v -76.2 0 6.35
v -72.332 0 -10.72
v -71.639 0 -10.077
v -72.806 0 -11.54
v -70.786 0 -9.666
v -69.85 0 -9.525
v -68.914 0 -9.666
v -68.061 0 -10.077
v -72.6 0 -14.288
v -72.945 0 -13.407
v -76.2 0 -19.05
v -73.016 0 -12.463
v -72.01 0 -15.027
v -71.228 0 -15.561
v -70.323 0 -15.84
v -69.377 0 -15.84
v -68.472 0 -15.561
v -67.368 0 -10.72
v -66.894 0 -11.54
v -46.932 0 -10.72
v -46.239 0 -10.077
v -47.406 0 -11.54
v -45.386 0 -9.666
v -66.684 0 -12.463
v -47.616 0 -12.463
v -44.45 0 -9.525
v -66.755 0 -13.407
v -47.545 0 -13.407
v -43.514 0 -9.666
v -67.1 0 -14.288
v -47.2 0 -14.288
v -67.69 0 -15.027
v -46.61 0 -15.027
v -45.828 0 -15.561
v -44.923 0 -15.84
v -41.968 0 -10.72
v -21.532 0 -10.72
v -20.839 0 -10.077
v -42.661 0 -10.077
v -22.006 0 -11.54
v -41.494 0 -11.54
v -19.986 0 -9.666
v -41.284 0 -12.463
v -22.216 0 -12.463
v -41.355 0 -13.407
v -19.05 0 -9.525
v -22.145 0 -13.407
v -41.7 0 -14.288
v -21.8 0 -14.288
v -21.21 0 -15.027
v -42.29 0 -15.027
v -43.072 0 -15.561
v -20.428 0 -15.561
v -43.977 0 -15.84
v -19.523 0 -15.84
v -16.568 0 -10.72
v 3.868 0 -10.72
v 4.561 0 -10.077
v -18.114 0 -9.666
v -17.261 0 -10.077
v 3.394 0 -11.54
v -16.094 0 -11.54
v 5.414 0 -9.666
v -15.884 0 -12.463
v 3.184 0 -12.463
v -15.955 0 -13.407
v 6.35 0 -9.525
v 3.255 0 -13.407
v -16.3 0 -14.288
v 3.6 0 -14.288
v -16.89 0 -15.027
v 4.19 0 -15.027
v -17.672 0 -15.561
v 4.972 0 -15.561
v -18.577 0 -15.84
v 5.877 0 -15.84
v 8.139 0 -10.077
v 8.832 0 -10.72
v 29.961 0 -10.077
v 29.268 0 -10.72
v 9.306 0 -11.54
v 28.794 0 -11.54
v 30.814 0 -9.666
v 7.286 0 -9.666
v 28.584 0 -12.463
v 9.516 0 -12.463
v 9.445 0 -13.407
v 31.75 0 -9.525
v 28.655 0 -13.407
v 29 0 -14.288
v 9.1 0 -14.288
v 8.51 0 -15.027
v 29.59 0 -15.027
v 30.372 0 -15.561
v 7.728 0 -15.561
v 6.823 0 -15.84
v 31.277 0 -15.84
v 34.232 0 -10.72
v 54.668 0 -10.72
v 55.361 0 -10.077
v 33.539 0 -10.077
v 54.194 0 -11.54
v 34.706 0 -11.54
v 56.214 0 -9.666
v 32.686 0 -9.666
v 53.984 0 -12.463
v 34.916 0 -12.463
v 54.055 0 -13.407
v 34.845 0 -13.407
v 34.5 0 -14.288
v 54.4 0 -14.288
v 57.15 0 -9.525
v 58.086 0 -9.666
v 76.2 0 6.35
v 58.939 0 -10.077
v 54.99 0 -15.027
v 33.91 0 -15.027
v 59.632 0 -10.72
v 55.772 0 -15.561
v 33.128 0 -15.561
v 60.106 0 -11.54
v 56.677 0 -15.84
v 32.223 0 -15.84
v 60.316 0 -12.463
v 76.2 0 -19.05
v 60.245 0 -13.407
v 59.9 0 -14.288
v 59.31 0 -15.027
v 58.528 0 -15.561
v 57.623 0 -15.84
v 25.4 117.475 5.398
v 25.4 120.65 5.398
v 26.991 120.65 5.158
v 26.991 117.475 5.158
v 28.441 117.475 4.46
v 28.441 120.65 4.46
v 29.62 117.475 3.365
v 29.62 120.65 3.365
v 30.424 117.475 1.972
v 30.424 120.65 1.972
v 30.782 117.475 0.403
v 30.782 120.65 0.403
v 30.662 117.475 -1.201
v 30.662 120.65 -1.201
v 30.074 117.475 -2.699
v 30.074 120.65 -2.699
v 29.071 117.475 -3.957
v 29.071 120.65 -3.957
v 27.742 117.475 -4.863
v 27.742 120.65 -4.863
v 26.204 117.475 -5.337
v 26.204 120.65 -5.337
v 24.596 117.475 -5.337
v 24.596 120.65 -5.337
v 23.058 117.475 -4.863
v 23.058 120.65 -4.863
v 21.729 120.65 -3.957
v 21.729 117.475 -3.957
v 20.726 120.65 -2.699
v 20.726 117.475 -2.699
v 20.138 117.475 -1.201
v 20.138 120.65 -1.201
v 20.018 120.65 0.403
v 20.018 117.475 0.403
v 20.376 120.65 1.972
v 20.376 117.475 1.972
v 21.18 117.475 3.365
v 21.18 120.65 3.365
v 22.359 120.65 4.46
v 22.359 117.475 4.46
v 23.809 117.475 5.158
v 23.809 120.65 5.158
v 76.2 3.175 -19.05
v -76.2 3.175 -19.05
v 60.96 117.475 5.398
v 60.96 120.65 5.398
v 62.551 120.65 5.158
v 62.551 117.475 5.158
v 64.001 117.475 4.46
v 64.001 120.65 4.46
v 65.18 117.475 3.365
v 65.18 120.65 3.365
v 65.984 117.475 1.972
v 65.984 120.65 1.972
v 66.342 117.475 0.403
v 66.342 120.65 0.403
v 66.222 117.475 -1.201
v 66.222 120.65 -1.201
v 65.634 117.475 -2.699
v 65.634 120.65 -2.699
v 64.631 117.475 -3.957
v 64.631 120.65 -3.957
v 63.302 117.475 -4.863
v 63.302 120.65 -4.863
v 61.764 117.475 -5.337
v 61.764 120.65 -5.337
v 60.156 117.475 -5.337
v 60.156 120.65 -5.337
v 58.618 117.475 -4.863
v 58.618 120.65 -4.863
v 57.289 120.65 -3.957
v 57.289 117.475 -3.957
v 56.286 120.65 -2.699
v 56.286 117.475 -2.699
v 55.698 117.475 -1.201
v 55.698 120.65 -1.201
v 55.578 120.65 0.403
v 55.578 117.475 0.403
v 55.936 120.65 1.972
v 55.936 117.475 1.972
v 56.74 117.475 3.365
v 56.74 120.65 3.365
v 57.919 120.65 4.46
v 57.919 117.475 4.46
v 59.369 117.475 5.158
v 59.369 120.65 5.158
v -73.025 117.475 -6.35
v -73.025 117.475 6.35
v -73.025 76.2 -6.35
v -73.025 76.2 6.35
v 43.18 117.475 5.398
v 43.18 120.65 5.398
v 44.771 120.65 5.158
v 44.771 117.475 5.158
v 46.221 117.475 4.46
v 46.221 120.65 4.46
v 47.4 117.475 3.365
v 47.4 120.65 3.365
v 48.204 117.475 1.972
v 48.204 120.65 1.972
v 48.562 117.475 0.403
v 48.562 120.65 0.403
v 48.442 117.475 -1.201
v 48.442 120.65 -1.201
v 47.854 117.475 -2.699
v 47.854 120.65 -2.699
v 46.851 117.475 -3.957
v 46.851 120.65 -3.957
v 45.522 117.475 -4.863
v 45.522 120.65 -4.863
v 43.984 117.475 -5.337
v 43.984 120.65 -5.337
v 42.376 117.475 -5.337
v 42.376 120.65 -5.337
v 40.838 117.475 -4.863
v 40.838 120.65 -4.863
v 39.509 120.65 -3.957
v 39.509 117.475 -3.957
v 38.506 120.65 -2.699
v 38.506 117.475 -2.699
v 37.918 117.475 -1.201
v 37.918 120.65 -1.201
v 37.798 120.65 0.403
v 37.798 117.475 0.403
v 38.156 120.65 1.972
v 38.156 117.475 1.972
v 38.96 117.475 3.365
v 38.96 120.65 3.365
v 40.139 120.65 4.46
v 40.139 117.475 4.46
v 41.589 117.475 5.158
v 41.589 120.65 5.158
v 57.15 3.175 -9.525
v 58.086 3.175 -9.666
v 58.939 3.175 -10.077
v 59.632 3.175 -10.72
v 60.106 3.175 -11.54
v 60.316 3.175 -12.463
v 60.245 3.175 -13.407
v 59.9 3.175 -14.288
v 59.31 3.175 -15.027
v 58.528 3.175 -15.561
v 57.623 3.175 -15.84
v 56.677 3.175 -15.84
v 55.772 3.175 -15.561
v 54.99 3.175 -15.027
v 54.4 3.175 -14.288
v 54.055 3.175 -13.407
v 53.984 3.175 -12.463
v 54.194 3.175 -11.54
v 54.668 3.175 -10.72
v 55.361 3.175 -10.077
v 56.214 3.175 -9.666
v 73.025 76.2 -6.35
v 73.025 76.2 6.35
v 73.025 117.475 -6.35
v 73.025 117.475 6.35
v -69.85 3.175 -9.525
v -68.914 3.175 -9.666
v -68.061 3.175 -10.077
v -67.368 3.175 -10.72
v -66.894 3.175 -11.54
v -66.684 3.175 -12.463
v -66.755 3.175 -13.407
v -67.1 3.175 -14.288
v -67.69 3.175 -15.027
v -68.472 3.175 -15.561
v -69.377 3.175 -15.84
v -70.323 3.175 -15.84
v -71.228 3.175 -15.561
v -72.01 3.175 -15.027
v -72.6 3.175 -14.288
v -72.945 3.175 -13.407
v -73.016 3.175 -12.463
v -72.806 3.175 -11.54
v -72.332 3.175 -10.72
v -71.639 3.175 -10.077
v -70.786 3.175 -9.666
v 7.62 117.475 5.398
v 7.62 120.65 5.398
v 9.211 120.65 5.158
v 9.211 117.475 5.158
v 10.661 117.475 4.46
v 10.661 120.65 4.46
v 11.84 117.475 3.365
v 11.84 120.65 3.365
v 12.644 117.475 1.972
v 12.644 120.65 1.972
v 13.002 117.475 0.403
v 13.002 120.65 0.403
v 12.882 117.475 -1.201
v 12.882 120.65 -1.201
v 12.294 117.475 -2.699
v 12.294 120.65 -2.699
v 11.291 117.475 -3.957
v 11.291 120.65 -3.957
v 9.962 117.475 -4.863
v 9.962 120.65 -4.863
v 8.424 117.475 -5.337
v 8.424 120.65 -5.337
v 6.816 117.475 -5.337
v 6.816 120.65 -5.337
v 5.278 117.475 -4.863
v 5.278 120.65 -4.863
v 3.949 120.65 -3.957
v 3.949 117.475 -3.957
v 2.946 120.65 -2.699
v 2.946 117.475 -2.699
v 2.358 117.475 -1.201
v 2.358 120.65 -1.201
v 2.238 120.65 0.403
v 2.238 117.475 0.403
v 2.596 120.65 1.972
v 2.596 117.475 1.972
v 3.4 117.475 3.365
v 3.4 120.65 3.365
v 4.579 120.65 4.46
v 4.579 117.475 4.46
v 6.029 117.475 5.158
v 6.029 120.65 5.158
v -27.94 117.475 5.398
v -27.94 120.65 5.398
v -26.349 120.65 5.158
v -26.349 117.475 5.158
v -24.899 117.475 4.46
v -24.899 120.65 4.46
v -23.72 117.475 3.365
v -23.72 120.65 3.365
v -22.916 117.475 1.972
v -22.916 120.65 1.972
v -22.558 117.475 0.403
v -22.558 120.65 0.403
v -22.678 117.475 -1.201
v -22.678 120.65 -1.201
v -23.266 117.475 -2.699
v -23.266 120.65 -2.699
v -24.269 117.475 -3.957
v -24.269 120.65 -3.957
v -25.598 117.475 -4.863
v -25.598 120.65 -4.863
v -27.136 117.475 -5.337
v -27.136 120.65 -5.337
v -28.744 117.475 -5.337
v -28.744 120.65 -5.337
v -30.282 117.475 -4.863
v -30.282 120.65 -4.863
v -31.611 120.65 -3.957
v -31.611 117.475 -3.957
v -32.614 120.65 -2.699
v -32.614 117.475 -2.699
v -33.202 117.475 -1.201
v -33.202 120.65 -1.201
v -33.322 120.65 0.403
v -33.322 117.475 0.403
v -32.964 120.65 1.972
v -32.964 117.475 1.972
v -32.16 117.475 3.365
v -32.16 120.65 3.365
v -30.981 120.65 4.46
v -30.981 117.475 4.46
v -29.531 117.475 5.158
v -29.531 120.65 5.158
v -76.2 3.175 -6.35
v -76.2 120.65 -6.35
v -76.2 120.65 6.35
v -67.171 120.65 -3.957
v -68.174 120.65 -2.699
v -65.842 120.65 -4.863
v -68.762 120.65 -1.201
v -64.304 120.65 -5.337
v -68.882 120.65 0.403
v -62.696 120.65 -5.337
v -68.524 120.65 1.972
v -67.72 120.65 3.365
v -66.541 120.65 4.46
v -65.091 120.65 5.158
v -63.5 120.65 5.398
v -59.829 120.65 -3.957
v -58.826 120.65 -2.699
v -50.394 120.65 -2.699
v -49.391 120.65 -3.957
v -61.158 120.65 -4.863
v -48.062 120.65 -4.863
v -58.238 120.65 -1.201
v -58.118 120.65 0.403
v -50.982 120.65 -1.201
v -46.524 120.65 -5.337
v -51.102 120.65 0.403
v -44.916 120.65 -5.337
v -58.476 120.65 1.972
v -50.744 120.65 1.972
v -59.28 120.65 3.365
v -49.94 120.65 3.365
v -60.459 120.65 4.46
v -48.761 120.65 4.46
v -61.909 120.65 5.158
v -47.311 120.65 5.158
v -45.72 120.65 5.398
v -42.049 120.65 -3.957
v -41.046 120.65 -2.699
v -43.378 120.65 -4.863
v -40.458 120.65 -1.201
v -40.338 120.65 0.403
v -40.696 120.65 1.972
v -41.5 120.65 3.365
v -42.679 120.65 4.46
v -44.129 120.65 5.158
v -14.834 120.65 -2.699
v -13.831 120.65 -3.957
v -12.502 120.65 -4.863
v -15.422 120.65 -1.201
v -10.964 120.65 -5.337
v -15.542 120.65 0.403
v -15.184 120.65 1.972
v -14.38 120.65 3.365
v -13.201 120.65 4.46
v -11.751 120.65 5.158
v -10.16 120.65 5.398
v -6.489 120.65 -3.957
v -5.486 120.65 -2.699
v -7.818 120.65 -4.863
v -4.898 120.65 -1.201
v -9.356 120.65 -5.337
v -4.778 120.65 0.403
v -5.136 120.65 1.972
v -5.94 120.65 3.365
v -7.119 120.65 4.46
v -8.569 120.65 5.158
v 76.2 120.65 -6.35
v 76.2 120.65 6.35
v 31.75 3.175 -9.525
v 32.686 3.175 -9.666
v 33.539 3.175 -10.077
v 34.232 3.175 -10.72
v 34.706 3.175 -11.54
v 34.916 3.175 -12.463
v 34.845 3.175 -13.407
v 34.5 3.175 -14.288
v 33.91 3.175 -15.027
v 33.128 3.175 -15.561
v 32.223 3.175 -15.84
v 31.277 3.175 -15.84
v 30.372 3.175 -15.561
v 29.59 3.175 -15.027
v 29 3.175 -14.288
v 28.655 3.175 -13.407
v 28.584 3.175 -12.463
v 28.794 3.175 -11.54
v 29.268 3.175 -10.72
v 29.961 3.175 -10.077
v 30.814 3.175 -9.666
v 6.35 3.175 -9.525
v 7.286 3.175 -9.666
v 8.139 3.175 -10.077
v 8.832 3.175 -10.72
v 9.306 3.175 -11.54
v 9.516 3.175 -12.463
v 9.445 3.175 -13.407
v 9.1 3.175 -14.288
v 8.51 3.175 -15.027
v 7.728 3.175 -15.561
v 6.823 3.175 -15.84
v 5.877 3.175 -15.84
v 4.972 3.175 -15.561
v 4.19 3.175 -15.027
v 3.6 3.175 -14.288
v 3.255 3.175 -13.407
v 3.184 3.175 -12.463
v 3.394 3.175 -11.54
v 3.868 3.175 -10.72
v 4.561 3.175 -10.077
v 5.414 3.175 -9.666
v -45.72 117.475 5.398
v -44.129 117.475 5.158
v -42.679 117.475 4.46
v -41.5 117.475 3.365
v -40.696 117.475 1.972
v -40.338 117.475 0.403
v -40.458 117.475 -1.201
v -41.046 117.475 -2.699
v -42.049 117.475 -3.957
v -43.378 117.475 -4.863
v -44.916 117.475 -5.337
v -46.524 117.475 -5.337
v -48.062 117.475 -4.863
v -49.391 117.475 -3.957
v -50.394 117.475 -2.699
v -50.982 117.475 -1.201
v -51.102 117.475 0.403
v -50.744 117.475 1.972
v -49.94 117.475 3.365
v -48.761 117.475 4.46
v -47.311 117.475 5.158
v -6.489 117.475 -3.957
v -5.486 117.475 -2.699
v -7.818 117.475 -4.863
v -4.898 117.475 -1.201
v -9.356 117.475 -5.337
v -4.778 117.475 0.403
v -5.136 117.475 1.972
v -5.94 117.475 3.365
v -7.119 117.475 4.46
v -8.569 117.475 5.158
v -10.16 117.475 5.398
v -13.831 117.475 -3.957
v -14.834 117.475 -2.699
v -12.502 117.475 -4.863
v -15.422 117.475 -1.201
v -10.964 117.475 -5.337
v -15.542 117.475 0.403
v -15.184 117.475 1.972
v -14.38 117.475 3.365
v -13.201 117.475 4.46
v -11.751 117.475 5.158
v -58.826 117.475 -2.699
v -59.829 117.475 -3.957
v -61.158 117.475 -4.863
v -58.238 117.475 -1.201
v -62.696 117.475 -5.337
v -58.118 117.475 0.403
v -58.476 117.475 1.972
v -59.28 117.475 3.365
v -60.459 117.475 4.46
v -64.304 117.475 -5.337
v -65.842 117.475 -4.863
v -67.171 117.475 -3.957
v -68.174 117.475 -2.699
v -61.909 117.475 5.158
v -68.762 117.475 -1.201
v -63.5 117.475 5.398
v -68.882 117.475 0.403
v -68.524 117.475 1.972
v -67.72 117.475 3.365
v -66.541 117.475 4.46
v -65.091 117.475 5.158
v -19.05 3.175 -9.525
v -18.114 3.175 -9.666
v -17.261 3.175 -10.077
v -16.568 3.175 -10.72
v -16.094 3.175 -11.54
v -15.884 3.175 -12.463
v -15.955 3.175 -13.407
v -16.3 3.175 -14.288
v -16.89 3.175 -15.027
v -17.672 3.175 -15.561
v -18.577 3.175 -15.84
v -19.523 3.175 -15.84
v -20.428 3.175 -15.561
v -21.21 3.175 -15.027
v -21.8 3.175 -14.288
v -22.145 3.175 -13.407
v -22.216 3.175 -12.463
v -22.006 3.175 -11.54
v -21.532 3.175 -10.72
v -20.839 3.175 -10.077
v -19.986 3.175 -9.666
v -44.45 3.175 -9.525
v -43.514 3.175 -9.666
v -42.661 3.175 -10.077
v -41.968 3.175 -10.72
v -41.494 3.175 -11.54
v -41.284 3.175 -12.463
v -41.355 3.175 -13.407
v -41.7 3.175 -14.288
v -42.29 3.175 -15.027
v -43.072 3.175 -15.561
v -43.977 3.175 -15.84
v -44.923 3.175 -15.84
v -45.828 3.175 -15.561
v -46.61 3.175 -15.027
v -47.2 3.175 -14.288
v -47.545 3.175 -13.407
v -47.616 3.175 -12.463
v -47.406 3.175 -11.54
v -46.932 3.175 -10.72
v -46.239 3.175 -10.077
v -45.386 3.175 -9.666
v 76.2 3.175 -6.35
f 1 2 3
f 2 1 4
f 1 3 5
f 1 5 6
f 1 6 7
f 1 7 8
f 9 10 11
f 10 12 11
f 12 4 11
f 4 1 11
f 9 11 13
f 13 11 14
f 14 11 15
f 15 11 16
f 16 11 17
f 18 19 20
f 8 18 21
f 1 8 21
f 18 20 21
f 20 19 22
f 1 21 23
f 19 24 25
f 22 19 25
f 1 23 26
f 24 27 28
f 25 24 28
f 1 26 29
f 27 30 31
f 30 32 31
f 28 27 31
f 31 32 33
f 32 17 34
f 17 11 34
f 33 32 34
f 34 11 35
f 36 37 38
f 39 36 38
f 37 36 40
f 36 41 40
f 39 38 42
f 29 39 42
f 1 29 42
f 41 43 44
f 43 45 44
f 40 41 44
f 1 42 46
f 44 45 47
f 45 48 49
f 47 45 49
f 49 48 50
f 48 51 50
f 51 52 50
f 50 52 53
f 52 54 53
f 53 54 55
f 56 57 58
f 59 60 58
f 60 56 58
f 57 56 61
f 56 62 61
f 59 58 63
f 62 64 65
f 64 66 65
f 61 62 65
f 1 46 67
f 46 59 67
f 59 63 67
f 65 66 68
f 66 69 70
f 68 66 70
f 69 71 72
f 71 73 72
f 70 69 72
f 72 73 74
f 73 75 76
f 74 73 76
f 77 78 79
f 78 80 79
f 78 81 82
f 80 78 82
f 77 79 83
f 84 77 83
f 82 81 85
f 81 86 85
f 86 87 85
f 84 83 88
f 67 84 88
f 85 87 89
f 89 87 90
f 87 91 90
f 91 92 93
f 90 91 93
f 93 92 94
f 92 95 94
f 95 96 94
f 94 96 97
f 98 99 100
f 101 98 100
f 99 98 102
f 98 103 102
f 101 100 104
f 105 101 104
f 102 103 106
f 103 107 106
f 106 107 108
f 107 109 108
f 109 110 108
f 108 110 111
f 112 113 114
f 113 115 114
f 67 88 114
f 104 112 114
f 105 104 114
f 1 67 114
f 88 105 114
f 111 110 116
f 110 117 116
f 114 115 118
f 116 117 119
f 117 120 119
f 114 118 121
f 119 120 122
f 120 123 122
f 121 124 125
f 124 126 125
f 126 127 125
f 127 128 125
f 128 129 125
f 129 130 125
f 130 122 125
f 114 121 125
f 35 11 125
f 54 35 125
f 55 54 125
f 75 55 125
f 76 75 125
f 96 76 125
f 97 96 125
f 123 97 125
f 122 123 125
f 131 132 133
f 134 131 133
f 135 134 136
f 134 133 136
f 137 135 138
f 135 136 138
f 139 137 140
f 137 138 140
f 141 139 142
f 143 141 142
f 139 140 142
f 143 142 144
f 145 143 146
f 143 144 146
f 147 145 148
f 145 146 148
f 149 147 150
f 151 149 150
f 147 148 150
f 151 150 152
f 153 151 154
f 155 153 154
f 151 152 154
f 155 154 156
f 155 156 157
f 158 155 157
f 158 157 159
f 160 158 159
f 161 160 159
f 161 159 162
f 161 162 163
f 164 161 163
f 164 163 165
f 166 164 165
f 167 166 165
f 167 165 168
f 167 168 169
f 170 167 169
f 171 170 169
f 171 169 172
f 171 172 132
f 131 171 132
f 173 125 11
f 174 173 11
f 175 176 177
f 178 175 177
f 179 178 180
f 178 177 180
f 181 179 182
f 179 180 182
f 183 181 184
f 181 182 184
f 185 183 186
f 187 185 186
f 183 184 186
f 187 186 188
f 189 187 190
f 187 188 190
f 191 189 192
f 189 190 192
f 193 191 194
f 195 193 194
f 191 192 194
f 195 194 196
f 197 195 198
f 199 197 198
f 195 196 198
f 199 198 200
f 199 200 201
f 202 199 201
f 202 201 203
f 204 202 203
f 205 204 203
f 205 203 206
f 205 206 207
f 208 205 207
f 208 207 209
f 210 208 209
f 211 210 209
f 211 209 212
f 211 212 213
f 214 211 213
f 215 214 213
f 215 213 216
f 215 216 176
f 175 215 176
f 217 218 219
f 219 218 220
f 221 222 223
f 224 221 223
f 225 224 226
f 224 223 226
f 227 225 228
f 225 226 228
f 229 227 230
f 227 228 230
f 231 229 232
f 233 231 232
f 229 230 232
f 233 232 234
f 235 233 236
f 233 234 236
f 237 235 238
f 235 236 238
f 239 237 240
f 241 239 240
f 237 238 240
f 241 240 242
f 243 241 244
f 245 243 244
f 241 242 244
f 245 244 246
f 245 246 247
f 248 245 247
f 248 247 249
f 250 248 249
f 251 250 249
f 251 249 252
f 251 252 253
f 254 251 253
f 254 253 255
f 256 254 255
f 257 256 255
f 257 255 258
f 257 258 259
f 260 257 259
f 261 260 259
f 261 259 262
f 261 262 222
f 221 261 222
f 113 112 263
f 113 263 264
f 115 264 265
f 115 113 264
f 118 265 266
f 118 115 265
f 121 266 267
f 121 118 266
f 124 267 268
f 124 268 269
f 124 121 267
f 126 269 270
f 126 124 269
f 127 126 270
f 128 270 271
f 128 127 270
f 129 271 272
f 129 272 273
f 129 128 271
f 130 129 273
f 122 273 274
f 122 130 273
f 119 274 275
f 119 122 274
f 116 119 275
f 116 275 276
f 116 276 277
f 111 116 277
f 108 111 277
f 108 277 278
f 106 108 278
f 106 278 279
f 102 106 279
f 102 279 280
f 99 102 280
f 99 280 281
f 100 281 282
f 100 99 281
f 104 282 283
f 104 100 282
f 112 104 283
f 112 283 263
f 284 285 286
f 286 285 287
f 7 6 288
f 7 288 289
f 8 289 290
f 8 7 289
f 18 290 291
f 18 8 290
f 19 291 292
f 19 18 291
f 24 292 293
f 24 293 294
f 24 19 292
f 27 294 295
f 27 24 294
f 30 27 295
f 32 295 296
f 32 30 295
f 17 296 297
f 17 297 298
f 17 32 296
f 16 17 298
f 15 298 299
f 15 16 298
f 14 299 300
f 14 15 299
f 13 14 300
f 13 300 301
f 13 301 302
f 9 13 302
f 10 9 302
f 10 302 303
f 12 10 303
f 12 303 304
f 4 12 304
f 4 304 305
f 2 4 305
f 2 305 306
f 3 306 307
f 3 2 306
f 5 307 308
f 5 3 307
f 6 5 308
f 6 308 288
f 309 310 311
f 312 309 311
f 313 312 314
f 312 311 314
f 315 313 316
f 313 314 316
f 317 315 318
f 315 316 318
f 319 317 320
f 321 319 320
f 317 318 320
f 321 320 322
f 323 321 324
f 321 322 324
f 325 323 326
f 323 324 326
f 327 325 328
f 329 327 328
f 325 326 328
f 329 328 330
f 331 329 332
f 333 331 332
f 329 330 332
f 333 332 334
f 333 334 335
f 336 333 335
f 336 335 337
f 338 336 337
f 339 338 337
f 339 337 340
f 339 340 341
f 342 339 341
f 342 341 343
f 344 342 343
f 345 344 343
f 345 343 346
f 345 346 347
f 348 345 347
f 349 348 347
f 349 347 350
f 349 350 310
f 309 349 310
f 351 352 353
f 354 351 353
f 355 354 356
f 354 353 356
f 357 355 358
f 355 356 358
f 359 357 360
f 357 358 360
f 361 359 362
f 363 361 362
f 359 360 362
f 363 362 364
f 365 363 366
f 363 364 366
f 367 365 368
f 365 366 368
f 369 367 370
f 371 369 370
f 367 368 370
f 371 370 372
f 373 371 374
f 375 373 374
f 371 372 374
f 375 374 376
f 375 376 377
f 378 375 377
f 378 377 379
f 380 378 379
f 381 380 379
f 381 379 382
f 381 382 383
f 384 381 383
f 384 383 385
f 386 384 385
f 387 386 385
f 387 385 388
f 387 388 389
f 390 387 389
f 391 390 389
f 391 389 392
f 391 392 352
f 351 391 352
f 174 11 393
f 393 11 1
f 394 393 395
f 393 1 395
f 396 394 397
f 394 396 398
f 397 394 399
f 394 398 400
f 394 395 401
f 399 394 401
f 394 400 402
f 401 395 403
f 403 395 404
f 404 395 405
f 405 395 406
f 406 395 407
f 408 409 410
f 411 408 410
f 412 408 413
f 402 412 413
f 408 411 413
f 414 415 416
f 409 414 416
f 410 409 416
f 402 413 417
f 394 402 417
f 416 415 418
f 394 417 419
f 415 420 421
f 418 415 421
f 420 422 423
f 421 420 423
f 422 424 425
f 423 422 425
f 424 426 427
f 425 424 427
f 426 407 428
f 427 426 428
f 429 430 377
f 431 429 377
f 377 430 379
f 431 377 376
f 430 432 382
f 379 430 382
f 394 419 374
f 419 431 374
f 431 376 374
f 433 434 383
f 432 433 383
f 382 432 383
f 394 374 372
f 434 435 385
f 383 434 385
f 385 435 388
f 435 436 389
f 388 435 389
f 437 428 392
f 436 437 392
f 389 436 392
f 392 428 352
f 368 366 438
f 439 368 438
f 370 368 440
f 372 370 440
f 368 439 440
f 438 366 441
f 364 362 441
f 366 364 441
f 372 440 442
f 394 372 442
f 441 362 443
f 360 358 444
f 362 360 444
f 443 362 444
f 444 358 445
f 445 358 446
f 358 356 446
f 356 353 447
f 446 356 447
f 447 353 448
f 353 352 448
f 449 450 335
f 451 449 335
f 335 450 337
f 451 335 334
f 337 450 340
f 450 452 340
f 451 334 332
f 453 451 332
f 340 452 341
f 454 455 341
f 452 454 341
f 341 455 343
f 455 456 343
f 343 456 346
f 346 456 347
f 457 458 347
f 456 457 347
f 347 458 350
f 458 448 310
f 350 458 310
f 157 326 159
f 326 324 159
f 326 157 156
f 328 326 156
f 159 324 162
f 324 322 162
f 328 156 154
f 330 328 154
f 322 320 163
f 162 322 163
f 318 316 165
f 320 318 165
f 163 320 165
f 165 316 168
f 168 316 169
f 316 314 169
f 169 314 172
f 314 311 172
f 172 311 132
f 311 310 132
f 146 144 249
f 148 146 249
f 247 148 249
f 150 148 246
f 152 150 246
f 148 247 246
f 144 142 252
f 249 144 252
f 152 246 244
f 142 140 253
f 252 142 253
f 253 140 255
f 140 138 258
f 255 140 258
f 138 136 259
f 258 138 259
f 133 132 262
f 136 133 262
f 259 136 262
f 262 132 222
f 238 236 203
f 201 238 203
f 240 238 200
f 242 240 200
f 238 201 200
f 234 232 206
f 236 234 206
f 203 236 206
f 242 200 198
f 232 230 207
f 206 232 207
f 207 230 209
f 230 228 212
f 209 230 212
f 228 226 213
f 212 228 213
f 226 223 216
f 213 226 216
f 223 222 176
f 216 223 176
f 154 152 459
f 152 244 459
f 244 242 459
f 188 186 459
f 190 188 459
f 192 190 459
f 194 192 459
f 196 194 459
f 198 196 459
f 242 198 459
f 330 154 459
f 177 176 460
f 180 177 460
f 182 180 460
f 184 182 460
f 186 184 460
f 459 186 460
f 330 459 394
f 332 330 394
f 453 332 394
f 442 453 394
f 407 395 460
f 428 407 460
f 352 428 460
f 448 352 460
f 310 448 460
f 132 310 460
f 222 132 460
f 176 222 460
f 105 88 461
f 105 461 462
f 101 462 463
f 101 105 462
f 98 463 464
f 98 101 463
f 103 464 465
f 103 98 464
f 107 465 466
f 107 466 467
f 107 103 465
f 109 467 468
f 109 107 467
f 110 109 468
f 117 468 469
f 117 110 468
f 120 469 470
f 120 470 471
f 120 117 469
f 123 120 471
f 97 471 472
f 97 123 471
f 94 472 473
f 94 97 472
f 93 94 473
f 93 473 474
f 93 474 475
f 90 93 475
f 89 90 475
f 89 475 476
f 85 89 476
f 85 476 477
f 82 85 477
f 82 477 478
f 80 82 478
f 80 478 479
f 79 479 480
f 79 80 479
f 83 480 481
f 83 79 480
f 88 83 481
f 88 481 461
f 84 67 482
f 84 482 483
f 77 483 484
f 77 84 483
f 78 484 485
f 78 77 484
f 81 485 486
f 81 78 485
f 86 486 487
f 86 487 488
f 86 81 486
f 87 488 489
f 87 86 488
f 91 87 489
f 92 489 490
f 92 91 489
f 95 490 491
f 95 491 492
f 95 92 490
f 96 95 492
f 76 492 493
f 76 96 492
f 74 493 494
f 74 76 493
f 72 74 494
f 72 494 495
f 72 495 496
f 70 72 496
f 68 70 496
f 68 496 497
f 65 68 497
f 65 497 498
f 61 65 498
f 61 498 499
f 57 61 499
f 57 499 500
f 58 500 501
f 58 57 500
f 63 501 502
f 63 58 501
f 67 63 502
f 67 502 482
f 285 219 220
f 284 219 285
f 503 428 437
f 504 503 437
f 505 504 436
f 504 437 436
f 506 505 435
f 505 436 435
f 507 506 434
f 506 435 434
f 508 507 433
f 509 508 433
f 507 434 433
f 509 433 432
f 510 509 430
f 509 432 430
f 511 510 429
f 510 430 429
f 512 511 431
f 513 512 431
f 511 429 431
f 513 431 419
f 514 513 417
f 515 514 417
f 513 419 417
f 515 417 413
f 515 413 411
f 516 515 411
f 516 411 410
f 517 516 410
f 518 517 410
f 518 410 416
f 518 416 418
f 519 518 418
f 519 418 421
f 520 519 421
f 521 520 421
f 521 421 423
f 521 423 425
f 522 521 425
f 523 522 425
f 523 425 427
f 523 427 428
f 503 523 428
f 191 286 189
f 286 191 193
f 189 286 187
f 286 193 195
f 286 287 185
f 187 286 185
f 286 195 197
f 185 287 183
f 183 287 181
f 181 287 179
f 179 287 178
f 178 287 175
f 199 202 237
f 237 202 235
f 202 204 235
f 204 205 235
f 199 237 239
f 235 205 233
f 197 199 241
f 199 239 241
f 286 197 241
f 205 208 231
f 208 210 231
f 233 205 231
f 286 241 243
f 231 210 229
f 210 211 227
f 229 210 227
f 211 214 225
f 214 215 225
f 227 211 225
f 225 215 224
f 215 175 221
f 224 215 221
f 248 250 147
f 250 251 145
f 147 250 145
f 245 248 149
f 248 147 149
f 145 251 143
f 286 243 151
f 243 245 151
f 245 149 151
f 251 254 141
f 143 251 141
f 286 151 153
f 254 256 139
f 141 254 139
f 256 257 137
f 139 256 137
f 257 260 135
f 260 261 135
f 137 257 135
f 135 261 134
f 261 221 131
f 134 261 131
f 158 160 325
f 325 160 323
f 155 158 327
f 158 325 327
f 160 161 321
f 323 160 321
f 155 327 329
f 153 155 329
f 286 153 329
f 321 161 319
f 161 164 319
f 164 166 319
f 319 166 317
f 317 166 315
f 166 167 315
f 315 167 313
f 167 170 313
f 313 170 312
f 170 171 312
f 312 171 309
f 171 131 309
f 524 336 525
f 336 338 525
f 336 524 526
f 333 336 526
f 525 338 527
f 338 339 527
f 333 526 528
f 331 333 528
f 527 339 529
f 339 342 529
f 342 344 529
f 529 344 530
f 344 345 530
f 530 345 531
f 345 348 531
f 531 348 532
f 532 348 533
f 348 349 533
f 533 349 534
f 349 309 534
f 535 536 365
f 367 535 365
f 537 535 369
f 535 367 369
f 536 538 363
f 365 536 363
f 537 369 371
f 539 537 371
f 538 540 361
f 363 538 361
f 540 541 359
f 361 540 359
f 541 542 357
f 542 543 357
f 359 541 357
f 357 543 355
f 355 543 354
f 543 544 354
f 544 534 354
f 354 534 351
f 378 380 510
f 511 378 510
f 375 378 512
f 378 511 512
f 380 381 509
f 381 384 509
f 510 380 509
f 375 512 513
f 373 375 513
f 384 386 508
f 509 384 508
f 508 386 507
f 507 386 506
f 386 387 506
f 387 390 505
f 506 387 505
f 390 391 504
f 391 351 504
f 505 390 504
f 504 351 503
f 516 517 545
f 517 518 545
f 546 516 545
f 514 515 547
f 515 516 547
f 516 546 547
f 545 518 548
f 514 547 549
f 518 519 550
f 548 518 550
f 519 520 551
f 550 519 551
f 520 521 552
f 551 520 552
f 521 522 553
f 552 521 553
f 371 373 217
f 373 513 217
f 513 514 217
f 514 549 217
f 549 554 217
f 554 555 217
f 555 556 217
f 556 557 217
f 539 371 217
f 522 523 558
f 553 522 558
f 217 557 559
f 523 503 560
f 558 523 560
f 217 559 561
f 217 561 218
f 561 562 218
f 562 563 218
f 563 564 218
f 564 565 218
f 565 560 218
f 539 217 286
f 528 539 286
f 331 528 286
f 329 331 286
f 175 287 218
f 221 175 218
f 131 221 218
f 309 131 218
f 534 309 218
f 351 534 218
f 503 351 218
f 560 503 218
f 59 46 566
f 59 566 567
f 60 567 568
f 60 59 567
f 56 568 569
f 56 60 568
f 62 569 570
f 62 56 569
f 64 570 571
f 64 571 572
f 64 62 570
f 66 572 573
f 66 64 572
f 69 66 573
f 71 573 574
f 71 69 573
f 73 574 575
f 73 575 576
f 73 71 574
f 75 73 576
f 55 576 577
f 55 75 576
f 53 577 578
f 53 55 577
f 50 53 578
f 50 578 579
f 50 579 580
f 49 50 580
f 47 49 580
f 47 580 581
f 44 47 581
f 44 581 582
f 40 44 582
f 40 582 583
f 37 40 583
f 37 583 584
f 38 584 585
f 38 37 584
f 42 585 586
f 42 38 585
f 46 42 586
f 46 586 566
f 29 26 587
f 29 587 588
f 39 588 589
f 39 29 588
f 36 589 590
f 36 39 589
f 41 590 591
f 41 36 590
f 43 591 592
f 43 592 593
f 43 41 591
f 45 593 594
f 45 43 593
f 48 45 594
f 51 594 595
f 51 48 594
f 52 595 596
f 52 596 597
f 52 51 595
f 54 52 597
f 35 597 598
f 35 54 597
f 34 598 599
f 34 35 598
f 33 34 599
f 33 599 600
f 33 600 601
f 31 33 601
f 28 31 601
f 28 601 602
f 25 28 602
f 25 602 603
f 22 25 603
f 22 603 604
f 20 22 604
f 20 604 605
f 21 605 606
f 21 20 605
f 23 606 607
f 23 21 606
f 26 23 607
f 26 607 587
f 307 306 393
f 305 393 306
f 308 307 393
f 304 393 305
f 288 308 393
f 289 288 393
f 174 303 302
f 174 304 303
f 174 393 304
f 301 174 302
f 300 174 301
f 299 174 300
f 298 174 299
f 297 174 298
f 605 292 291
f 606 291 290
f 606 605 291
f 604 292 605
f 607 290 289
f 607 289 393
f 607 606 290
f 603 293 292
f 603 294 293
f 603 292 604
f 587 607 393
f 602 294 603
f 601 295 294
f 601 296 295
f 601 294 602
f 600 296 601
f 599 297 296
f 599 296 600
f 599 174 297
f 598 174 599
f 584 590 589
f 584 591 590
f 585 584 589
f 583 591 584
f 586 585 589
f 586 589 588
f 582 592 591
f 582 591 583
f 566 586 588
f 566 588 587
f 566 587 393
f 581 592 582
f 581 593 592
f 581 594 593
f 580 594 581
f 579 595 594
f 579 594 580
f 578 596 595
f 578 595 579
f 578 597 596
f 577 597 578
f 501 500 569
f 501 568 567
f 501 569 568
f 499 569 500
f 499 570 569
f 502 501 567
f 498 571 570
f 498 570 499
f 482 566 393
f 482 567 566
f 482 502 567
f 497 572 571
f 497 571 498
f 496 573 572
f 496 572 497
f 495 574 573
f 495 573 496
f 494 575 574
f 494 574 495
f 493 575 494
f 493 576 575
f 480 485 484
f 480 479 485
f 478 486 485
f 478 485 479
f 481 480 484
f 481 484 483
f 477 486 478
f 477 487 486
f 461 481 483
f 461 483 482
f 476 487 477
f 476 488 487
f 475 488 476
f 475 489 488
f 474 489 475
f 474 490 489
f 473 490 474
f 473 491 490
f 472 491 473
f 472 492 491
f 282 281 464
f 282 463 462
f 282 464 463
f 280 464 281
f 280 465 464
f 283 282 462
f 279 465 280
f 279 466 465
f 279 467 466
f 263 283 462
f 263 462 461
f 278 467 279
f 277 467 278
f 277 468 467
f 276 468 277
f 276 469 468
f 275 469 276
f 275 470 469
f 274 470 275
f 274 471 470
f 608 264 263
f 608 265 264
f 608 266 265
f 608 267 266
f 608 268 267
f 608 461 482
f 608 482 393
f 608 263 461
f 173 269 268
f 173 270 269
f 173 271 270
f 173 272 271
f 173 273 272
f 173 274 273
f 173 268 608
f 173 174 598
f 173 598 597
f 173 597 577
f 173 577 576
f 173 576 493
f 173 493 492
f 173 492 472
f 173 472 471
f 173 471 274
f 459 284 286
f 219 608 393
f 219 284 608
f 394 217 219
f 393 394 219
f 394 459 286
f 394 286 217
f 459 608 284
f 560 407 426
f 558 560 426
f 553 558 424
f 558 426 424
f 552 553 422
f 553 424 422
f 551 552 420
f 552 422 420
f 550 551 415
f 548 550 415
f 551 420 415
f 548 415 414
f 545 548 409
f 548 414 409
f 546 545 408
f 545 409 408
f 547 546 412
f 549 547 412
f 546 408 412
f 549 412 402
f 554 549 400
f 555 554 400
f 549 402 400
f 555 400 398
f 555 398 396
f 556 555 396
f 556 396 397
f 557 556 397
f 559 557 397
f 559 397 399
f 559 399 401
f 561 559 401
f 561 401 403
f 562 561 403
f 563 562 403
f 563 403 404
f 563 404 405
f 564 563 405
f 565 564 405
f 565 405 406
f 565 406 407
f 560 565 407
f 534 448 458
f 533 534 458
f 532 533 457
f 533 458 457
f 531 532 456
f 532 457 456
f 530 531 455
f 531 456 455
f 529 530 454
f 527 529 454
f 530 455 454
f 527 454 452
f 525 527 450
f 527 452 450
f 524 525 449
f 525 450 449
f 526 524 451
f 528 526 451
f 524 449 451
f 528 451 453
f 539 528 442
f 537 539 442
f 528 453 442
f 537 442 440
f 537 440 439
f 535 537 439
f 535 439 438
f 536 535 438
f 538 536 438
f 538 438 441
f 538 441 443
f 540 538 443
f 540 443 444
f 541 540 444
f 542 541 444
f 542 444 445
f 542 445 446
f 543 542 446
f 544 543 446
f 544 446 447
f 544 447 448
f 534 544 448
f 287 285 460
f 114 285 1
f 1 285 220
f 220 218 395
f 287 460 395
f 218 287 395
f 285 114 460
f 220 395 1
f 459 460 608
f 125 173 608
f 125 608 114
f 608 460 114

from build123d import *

# Parameters (mm, degrees)
SKETCH1_W           = 152.4
SKETCH1_H           = 12.7
BOSS_EXTRUDE1_DEPTH = 76.2
SKETCH2_R           = 3.175
BOSS_EXTRUDE4_DEPTH = 3.175
BOSS_EXTRUDE5_DEPTH = 12.7
CUT_EXTRUDE1_REACH  = 145.964
SKETCH4_R           = 5.3975


with BuildPart() as part:
    # Sketch1 → Boss-Extrude1 (new body)
    with BuildSketch(Plane(origin=(0, 0, 0), x_dir=(1, 0, 0), z_dir=(0, 1, 0))):
        Rectangle(SKETCH1_W, SKETCH1_H)
    extrude(amount=BOSS_EXTRUDE1_DEPTH)

    # Sketch2 → Boss-Extrude4 (add)
    with BuildSketch(Plane(origin=(0, 0, 0), x_dir=(1, 0, 0), z_dir=(0, 1, 0))):
        Polygon((-76.2, 12.7), (-76.2, 6.35), (76.2, 6.35), (76.2, 19.05), (-76.2, 19.05), align=None)
        with Locations(Location((-69.85, 12.7, 0), (0, 0, 270))):
            Circle(SKETCH2_R, mode=Mode.SUBTRACT)
        with Locations(Location((-44.45, 12.7, 0), (0, 0, 270))):
            Circle(SKETCH2_R, mode=Mode.SUBTRACT)
        with Locations(Location((-19.05, 12.7, 0), (0, 0, 270))):
            Circle(SKETCH2_R, mode=Mode.SUBTRACT)
        with Locations(Location((6.35, 12.7, 0), (0, 0, 270))):
            Circle(SKETCH2_R, mode=Mode.SUBTRACT)
        with Locations(Location((31.75, 12.7, 0), (0, 0, 270))):
            Circle(SKETCH2_R, mode=Mode.SUBTRACT)
        with Locations(Location((57.15, 12.7, 0), (0, 0, 270))):
            Circle(SKETCH2_R, mode=Mode.SUBTRACT)
    extrude(amount=BOSS_EXTRUDE4_DEPTH)

    # Sketch3 → Boss-Extrude5 (add)
    with BuildSketch(Plane.XY.offset(6.35)):
        Polygon((-76.2, 76.2), (-76.2, 120.65), (76.2, 120.65), (76.2, 76.2), (73.025, 76.2), (73.025, 117.475), (-73.025, 117.475), (-73.025, 76.2), align=None)
    extrude(amount=-BOSS_EXTRUDE5_DEPTH)

    # Sketch4 → Cut-Extrude1 (cut, up to next)
    with BuildSketch(Plane(origin=(0, 120.65, 0), x_dir=(1, 0, 0), z_dir=(0, 1, 0)), mode=Mode.PRIVATE) as cut_extrude1_sk1:
        with Locations(Location((-63.5, 0, 0), (0, 0, 270))):
            Circle(SKETCH4_R)
    cut_extrude1_tool1 = extrude(cut_extrude1_sk1.sketch, amount=-CUT_EXTRUDE1_REACH, mode=Mode.PRIVATE) & part.part
    # Sketch4 → Cut-Extrude1 (cut, up to next)
    with BuildSketch(Plane(origin=(0, 120.65, 0), x_dir=(1, 0, 0), z_dir=(0, 1, 0)), mode=Mode.PRIVATE) as cut_extrude1_sk2:
        with Locations(Location((-45.72, 0, 0), (0, 0, 270))):
            Circle(SKETCH4_R)
    cut_extrude1_tool2 = extrude(cut_extrude1_sk2.sketch, amount=-CUT_EXTRUDE1_REACH, mode=Mode.PRIVATE) & part.part
    # Sketch4 → Cut-Extrude1 (cut, up to next)
    with BuildSketch(Plane(origin=(0, 120.65, 0), x_dir=(1, 0, 0), z_dir=(0, 1, 0)), mode=Mode.PRIVATE) as cut_extrude1_sk3:
        with Locations(Location((-27.94, 0, 0), (0, 0, 270))):
            Circle(SKETCH4_R)
    cut_extrude1_tool3 = extrude(cut_extrude1_sk3.sketch, amount=-CUT_EXTRUDE1_REACH, mode=Mode.PRIVATE) & part.part
    # Sketch4 → Cut-Extrude1 (cut, up to next)
    with BuildSketch(Plane(origin=(0, 120.65, 0), x_dir=(1, 0, 0), z_dir=(0, 1, 0)), mode=Mode.PRIVATE) as cut_extrude1_sk4:
        with Locations(Location((-10.16, 0, 0), (0, 0, 270))):
            Circle(SKETCH4_R)
    cut_extrude1_tool4 = extrude(cut_extrude1_sk4.sketch, amount=-CUT_EXTRUDE1_REACH, mode=Mode.PRIVATE) & part.part
    # Sketch4 → Cut-Extrude1 (cut, up to next)
    with BuildSketch(Plane(origin=(0, 120.65, 0), x_dir=(1, 0, 0), z_dir=(0, 1, 0)), mode=Mode.PRIVATE) as cut_extrude1_sk5:
        with Locations(Location((7.62, 0, 0), (0, 0, 270))):
            Circle(SKETCH4_R)
    cut_extrude1_tool5 = extrude(cut_extrude1_sk5.sketch, amount=-CUT_EXTRUDE1_REACH, mode=Mode.PRIVATE) & part.part
    # Sketch4 → Cut-Extrude1 (cut, up to next)
    with BuildSketch(Plane(origin=(0, 120.65, 0), x_dir=(1, 0, 0), z_dir=(0, 1, 0)), mode=Mode.PRIVATE) as cut_extrude1_sk6:
        with Locations(Location((25.4, 0, 0), (0, 0, 270))):
            Circle(SKETCH4_R)
    cut_extrude1_tool6 = extrude(cut_extrude1_sk6.sketch, amount=-CUT_EXTRUDE1_REACH, mode=Mode.PRIVATE) & part.part
    # Sketch4 → Cut-Extrude1 (cut, up to next)
    with BuildSketch(Plane(origin=(0, 120.65, 0), x_dir=(1, 0, 0), z_dir=(0, 1, 0)), mode=Mode.PRIVATE) as cut_extrude1_sk7:
        with Locations(Location((43.18, 0, 0), (0, 0, 270))):
            Circle(SKETCH4_R)
    cut_extrude1_tool7 = extrude(cut_extrude1_sk7.sketch, amount=-CUT_EXTRUDE1_REACH, mode=Mode.PRIVATE) & part.part
    # Sketch4 → Cut-Extrude1 (cut, up to next)
    with BuildSketch(Plane(origin=(0, 120.65, 0), x_dir=(1, 0, 0), z_dir=(0, 1, 0)), mode=Mode.PRIVATE) as cut_extrude1_sk8:
        with Locations(Location((60.96, 0, 0), (0, 0, 270))):
            Circle(SKETCH4_R)
    cut_extrude1_tool8 = extrude(cut_extrude1_sk8.sketch, amount=-CUT_EXTRUDE1_REACH, mode=Mode.PRIVATE) & part.part
    add(cut_extrude1_tool1.solids().sort_by_distance((-63.5, 120.65, 0))[0], mode=Mode.SUBTRACT)
    add(cut_extrude1_tool2.solids().sort_by_distance((-45.72, 120.65, 0))[0], mode=Mode.SUBTRACT)
    add(cut_extrude1_tool3.solids().sort_by_distance((-27.94, 120.65, 0))[0], mode=Mode.SUBTRACT)
    add(cut_extrude1_tool4.solids().sort_by_distance((-10.16, 120.65, 0))[0], mode=Mode.SUBTRACT)
    add(cut_extrude1_tool5.solids().sort_by_distance((7.62, 120.65, 0))[0], mode=Mode.SUBTRACT)
    add(cut_extrude1_tool6.solids().sort_by_distance((25.4, 120.65, 0))[0], mode=Mode.SUBTRACT)
    add(cut_extrude1_tool7.solids().sort_by_distance((43.18, 120.65, 0))[0], mode=Mode.SUBTRACT)
    add(cut_extrude1_tool8.solids().sort_by_distance((60.96, 120.65, 0))[0], mode=Mode.SUBTRACT)


solid = part.part
